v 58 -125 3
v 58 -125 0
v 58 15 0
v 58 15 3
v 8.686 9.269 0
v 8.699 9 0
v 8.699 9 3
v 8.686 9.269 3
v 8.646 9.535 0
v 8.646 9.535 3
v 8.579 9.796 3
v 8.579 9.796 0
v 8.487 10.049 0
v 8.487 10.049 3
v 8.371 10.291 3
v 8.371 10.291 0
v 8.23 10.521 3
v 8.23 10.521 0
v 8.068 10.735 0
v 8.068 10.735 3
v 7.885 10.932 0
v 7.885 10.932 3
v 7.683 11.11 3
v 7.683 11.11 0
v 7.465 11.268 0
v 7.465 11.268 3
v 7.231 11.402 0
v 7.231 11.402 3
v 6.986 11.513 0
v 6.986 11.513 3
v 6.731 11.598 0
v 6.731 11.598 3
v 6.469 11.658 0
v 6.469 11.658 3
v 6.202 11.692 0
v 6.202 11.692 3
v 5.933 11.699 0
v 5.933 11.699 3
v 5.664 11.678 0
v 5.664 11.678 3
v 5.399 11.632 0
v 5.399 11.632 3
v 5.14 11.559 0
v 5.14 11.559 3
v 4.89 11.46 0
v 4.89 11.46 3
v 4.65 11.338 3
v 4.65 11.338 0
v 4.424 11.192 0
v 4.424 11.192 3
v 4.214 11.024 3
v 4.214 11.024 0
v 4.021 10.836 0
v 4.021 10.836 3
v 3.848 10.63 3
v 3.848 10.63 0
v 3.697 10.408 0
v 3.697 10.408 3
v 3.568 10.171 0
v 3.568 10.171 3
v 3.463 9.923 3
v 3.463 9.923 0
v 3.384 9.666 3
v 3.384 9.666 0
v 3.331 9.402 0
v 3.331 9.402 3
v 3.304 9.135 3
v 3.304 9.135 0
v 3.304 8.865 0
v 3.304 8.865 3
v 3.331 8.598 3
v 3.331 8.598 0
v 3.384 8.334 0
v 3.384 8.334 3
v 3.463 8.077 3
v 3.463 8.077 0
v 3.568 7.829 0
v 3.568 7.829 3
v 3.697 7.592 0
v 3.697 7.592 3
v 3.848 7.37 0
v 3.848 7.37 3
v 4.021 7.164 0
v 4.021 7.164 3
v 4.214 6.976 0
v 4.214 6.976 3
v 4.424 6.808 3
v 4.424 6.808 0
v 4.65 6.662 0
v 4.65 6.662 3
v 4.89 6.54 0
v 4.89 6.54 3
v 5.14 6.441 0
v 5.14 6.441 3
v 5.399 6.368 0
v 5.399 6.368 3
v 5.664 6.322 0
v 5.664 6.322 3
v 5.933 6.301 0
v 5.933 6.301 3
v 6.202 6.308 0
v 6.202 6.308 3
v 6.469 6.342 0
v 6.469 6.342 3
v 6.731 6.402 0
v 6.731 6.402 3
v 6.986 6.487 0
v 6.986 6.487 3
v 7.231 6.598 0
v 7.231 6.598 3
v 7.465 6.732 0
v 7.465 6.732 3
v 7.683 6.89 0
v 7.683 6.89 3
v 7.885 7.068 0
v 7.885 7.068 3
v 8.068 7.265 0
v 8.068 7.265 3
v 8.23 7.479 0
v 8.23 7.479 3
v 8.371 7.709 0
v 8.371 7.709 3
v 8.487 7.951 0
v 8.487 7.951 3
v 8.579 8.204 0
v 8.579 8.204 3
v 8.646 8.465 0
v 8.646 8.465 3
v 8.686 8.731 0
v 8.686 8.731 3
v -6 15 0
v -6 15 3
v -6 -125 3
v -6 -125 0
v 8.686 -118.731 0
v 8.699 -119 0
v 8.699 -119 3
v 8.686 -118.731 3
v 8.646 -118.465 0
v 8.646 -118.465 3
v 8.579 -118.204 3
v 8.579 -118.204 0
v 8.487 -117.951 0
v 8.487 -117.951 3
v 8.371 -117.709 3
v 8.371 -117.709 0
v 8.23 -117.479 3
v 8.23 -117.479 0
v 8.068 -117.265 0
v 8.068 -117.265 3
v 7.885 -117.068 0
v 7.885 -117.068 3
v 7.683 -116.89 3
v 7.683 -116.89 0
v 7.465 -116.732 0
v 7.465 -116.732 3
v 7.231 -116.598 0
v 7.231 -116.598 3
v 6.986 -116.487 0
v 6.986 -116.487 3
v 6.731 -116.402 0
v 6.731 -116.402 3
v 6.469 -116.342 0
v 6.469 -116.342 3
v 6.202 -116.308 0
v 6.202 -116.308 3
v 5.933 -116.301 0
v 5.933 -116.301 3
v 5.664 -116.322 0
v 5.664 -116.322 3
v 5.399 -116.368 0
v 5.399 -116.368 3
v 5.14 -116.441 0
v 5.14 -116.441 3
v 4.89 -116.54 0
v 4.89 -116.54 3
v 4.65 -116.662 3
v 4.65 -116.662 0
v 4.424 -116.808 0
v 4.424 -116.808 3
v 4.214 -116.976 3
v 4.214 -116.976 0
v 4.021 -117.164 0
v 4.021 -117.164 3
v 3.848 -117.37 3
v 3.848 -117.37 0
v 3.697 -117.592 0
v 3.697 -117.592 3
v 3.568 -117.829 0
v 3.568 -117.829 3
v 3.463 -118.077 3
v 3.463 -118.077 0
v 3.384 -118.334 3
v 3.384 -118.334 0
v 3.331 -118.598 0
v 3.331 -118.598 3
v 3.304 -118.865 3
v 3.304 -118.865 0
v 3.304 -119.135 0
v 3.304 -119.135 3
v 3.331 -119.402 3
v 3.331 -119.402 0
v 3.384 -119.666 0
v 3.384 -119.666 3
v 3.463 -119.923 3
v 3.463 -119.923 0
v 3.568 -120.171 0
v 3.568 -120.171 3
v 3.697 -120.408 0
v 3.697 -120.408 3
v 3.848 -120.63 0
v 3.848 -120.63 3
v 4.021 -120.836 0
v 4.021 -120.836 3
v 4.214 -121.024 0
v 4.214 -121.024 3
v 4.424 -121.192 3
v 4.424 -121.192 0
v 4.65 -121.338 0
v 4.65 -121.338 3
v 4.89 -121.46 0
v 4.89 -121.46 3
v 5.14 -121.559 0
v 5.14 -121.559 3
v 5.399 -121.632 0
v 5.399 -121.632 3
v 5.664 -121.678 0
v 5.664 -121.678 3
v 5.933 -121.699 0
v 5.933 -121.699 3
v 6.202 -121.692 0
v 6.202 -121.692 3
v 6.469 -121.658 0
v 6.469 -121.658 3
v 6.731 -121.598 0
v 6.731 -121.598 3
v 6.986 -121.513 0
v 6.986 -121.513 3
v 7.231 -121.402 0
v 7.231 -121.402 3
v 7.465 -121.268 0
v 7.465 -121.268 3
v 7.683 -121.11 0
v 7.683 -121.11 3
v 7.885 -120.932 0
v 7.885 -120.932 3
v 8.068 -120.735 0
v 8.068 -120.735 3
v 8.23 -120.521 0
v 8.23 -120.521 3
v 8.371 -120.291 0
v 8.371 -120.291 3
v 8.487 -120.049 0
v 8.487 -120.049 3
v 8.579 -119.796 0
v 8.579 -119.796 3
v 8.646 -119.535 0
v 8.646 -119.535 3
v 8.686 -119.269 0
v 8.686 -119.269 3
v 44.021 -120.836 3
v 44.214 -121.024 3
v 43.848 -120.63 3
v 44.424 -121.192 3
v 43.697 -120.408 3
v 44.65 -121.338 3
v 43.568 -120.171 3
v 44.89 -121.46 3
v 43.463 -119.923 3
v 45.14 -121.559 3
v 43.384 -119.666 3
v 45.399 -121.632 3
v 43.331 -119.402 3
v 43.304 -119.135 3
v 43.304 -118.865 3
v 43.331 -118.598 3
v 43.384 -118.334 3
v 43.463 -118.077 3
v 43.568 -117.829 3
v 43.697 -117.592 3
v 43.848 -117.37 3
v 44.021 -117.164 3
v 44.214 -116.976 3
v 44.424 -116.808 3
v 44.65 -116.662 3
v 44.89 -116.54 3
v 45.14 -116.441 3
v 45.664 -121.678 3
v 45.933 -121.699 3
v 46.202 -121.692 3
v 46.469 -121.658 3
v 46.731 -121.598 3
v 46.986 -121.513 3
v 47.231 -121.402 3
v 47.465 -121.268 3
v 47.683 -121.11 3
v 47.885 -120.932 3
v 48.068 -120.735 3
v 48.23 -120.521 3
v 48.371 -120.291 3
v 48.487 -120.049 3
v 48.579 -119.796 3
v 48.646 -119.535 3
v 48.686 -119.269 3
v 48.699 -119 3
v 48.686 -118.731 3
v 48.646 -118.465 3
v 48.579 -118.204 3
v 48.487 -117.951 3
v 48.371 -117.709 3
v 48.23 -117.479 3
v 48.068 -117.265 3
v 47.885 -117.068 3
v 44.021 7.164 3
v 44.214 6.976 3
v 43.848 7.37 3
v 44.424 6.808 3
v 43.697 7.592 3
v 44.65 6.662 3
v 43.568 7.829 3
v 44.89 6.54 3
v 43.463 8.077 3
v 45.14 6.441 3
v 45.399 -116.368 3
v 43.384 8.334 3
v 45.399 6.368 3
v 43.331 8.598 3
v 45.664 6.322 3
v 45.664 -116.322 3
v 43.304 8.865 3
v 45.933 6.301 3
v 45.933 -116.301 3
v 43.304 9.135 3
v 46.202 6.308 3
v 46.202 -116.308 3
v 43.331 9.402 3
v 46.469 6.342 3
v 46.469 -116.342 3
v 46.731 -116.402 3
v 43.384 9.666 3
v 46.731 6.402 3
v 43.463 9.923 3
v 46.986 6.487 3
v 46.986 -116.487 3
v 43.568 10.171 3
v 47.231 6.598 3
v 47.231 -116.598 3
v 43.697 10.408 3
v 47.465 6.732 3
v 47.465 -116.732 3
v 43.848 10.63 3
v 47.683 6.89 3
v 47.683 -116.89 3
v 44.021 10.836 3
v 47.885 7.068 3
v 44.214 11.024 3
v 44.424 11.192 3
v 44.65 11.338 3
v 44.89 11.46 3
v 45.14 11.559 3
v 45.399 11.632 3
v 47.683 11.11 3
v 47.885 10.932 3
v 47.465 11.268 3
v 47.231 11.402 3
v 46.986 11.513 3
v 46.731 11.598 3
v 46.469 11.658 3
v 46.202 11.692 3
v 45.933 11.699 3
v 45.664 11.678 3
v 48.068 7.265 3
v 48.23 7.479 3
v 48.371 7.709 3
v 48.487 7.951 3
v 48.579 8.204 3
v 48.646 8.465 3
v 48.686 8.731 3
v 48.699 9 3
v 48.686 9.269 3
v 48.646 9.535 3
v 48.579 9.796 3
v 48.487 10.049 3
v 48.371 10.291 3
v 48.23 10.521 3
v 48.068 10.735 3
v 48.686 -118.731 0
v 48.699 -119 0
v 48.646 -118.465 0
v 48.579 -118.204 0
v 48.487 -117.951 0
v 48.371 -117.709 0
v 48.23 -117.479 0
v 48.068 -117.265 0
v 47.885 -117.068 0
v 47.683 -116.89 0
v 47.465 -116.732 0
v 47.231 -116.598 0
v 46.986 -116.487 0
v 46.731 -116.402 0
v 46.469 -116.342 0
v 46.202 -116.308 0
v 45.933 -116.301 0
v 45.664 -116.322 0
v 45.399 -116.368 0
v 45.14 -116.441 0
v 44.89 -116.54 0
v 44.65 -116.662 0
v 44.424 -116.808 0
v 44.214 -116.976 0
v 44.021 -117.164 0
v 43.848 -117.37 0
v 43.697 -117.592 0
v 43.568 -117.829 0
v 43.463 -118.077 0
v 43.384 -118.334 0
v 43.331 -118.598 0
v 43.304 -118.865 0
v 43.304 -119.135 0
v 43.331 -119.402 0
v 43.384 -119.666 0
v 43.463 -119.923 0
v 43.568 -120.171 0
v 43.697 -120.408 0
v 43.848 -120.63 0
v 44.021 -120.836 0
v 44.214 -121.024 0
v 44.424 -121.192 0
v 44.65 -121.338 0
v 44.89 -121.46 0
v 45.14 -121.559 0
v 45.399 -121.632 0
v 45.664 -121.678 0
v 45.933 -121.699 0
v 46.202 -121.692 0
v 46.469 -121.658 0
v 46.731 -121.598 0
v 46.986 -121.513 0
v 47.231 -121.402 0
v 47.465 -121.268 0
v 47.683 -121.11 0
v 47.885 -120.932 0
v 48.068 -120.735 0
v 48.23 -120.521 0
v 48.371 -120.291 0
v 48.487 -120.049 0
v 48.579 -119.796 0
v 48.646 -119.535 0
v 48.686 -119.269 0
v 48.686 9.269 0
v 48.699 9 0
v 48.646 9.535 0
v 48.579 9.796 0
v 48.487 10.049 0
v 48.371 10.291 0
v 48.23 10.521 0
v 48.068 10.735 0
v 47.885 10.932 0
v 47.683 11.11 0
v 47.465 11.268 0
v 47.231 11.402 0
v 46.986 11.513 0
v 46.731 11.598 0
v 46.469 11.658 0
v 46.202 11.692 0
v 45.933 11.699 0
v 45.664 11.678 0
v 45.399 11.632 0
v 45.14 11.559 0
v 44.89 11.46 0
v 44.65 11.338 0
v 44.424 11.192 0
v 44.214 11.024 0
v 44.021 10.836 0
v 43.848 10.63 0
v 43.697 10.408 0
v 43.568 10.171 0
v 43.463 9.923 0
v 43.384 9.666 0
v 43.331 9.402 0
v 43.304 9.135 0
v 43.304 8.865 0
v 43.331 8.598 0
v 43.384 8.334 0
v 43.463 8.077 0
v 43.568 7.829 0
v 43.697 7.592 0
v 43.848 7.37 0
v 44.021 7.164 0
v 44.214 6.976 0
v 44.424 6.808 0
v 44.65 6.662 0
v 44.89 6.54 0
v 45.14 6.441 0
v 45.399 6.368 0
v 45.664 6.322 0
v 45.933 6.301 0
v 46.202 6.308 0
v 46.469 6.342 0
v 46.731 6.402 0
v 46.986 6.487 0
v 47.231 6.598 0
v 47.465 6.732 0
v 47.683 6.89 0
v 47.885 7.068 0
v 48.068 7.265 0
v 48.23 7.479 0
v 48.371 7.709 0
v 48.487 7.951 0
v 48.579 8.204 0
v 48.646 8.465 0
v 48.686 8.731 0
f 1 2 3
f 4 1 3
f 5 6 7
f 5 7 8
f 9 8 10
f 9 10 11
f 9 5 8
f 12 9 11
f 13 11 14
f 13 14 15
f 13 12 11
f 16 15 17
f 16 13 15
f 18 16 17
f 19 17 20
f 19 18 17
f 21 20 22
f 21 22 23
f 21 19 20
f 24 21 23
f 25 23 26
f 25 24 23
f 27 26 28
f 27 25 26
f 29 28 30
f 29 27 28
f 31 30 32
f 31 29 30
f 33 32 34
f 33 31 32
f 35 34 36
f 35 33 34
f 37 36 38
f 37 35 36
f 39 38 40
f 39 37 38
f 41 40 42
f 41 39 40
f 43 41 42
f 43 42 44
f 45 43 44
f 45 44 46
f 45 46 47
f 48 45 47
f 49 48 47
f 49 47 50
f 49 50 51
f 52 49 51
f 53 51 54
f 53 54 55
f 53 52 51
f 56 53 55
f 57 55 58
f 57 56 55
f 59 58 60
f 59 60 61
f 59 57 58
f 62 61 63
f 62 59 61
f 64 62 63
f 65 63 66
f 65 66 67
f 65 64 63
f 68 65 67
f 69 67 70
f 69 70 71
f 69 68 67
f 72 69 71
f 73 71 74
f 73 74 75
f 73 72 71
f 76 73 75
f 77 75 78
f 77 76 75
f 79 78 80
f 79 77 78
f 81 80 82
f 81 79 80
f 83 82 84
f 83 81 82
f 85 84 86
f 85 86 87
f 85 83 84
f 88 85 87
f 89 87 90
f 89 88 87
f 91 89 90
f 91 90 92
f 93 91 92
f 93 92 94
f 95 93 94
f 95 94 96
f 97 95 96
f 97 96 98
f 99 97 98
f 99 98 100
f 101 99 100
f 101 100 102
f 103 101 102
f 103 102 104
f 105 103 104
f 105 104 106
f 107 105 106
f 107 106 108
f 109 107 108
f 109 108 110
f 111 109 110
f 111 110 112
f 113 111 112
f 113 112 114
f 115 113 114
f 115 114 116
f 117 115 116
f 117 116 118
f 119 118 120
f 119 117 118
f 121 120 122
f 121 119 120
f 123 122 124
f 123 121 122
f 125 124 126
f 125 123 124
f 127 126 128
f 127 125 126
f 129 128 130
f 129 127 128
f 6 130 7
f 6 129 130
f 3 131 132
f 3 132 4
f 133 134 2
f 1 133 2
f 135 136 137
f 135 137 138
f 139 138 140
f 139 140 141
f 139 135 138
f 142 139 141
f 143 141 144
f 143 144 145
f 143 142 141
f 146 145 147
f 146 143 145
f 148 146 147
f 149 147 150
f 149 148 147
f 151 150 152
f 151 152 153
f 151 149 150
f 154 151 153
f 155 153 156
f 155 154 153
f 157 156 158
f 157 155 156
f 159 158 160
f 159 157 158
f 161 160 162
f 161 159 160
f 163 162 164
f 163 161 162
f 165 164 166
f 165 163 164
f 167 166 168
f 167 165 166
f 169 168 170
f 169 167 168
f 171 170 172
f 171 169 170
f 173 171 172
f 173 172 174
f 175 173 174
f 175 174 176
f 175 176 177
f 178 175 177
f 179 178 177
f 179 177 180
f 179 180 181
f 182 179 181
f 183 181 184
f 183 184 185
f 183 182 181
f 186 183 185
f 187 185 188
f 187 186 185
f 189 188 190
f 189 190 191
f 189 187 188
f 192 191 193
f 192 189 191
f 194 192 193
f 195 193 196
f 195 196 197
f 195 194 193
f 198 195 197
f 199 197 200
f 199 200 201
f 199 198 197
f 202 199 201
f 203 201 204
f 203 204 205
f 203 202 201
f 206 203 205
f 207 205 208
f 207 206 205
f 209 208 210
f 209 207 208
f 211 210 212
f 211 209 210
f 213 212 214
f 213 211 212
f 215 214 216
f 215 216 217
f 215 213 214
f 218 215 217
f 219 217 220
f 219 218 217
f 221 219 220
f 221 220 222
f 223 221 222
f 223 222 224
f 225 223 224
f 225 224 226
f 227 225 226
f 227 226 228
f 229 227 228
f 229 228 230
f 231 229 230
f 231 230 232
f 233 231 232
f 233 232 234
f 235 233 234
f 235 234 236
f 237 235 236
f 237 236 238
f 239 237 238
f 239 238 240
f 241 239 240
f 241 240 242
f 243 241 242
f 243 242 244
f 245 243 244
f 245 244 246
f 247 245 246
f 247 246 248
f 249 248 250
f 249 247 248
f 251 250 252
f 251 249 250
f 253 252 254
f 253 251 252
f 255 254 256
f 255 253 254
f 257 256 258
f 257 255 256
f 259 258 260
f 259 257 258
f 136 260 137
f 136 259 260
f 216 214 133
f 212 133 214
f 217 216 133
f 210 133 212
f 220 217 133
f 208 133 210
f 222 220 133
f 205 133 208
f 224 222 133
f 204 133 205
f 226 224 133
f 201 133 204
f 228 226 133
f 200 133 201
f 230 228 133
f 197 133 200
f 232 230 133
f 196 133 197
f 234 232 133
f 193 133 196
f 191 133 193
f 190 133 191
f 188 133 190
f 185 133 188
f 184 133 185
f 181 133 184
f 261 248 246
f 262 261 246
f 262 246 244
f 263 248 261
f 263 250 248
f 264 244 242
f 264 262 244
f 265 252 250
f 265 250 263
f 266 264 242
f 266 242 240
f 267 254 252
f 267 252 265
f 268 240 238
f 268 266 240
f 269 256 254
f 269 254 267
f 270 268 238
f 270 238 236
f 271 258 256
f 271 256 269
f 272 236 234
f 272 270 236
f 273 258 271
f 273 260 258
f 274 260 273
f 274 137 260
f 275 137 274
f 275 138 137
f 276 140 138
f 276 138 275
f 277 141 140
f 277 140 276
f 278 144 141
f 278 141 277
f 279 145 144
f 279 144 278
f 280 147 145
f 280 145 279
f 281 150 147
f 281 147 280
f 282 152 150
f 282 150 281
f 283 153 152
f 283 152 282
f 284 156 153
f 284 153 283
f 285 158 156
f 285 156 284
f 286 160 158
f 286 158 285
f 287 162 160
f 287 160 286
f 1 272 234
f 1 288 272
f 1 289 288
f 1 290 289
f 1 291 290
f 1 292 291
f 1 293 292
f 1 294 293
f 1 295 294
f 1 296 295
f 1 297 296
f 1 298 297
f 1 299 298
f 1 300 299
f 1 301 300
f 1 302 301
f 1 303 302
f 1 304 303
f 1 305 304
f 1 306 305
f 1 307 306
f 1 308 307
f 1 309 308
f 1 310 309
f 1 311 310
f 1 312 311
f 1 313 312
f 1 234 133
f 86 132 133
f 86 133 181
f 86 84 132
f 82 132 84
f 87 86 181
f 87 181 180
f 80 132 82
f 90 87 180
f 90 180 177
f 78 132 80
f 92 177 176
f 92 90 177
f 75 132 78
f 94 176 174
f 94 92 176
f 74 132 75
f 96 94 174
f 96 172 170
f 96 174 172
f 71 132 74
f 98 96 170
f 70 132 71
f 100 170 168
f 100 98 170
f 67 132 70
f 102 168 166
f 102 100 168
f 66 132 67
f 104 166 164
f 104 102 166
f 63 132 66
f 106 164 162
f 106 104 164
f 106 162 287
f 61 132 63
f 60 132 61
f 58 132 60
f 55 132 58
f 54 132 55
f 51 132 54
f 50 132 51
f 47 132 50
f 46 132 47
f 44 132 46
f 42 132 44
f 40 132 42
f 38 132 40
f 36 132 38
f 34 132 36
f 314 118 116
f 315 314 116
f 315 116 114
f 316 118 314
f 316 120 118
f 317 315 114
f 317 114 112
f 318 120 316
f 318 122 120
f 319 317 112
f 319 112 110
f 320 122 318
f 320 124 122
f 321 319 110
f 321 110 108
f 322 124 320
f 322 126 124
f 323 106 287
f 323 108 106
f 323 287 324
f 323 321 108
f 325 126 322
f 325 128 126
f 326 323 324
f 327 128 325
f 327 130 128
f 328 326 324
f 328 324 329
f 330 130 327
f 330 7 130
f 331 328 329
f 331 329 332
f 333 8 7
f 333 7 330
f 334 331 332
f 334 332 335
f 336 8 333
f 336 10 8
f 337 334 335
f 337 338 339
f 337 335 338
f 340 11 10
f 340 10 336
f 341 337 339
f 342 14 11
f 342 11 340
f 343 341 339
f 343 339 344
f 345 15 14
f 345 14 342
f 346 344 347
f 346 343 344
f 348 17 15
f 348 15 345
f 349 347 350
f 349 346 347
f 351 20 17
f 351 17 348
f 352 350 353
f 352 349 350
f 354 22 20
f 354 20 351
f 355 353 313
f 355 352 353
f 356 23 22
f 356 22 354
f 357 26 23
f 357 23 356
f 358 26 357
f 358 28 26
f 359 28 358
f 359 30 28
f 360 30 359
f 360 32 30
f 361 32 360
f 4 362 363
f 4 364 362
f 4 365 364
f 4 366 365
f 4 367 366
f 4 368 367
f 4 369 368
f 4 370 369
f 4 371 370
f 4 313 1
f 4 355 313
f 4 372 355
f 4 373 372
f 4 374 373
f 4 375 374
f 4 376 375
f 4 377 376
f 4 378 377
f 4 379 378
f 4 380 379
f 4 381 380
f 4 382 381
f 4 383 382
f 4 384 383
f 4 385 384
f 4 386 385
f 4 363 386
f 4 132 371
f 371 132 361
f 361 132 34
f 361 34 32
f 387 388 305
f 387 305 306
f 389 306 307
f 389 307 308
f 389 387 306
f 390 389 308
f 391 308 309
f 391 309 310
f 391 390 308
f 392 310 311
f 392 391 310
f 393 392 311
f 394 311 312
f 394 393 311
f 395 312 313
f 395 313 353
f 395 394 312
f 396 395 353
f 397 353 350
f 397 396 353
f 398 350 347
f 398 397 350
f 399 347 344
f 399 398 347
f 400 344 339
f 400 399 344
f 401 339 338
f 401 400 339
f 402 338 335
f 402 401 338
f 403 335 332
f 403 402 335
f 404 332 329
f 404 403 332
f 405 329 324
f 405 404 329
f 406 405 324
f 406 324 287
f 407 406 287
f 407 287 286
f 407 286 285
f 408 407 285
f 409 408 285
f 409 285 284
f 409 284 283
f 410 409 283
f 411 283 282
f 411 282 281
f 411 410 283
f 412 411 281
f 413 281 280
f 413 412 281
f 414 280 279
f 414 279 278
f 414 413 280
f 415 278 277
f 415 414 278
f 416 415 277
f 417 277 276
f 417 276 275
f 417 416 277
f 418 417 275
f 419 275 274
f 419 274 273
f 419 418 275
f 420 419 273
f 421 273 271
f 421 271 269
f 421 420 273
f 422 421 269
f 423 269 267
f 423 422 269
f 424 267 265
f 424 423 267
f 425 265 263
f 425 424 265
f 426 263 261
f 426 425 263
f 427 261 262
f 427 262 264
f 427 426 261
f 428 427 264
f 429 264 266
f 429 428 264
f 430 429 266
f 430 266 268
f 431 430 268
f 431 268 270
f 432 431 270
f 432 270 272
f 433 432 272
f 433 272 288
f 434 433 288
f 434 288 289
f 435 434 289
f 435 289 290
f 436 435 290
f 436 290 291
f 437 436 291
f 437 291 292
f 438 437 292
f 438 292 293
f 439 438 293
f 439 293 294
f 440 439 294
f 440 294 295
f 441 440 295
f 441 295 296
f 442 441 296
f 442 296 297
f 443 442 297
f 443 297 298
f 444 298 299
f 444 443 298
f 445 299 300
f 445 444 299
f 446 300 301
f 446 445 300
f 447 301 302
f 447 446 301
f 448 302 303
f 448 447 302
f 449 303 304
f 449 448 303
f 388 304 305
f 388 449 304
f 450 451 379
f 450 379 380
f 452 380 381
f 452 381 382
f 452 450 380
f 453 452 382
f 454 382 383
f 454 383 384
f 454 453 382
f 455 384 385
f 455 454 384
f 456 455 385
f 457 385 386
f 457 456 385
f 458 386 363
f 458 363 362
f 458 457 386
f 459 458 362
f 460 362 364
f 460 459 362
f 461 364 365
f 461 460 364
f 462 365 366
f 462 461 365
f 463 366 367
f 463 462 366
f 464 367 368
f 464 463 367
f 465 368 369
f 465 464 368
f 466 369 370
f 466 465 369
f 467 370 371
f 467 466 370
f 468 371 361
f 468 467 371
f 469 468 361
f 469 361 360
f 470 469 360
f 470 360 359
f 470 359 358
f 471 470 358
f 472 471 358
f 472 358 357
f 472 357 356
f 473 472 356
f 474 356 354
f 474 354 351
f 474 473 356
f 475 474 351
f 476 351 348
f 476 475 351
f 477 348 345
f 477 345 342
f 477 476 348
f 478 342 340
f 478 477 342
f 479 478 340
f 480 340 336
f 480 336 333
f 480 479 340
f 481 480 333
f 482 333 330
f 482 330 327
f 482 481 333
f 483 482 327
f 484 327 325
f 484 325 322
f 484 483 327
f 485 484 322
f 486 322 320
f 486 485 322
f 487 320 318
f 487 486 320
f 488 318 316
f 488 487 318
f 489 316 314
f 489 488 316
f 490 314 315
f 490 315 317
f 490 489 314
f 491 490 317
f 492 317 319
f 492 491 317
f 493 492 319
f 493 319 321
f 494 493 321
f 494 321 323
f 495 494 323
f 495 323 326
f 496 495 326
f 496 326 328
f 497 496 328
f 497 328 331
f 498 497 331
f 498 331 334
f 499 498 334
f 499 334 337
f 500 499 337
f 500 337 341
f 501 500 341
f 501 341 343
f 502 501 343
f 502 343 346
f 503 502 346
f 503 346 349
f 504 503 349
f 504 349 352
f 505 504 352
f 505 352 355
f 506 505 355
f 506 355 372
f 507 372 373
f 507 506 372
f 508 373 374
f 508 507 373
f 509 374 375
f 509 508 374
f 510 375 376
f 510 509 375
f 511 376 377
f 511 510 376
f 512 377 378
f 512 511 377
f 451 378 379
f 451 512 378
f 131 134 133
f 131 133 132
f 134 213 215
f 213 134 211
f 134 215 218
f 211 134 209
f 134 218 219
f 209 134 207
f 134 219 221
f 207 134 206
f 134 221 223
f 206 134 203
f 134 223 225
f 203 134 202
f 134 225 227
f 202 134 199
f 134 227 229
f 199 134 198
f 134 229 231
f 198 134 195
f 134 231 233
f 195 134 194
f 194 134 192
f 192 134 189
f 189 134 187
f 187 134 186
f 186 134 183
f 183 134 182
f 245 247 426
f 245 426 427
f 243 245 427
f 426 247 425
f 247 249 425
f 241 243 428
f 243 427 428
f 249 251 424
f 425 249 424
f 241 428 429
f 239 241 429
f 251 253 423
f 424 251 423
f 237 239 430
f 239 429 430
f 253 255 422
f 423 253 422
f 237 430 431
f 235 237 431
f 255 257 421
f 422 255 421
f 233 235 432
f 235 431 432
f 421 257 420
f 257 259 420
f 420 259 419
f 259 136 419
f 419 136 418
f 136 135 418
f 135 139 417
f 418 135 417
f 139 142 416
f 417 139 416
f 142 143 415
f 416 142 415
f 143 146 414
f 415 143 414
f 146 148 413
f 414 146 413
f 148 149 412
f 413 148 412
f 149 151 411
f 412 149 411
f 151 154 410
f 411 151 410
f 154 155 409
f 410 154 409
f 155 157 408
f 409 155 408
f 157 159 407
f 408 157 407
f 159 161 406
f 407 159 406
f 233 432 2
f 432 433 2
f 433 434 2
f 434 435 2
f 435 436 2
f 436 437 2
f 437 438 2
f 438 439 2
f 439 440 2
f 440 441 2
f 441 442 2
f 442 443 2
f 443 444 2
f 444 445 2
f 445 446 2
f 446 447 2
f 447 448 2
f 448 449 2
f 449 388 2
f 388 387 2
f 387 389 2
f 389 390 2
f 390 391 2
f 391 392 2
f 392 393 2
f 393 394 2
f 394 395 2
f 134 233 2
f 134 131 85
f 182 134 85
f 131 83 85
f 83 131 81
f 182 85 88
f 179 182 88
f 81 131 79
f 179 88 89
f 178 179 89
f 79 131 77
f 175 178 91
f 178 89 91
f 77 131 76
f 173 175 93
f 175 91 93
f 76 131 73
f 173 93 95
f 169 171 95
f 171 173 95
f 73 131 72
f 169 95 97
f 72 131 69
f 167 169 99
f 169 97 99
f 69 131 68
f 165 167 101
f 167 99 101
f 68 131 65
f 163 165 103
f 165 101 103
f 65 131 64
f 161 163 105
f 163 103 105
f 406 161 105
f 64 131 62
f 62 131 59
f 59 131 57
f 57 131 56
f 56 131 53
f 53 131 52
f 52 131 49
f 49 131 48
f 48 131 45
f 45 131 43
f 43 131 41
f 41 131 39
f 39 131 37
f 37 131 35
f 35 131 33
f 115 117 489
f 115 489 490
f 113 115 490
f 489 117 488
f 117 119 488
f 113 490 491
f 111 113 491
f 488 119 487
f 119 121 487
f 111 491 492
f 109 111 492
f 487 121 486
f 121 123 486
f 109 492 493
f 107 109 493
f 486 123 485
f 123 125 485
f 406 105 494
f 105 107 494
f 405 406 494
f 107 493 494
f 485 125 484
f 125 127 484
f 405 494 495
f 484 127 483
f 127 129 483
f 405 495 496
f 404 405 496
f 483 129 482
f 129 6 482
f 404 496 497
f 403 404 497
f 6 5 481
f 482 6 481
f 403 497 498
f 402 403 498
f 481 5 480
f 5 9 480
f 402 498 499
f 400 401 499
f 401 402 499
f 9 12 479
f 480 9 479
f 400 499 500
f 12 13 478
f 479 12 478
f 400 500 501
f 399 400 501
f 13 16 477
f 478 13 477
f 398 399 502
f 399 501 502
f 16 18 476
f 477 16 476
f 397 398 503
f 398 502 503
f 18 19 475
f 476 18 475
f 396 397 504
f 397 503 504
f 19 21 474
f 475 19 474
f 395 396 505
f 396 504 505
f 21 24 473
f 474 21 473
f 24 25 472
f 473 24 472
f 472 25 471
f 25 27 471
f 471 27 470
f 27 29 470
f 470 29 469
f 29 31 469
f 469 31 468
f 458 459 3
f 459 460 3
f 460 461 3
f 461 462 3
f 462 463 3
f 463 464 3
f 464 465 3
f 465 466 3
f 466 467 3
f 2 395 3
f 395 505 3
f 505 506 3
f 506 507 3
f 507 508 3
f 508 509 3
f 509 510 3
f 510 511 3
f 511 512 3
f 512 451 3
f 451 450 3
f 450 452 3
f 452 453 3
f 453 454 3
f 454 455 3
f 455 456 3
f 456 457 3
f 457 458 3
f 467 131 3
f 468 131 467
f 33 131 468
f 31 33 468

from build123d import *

# Parameters (mm, degrees)
SKETCH1_W           = 64
SKETCH1_H           = 140
SKETCH1_R           = 2.699339217
SKETCH1_W_2         = 52
SKETCH1_H_2         = 110
BOSS_EXTRUDE1_DEPTH = 3


with BuildPart() as part:
    # Sketch1 → Boss-Extrude1 (new body)
    # profile 1 of 2: a face of its own
    with BuildSketch(Plane.XY):
        with Locations((26, -55)):
            Rectangle(SKETCH1_W, SKETCH1_H)
        with Locations((46, 9)):
            Circle(SKETCH1_R, mode=Mode.SUBTRACT)
        with Locations((6, 9)):
            Circle(SKETCH1_R, mode=Mode.SUBTRACT)
        with Locations((46, -119)):
            Circle(SKETCH1_R, mode=Mode.SUBTRACT)
        with Locations((6, -119)):
            Circle(SKETCH1_R, mode=Mode.SUBTRACT)
        with Locations((26, -55)):
            Rectangle(SKETCH1_W_2, SKETCH1_H_2, mode=Mode.SUBTRACT)
    # profile 2 of 2: a face of its own
    with BuildSketch(Plane.XY):
        with Locations((26, -55)):
            Rectangle(SKETCH1_W_2, SKETCH1_H_2)
    extrude(amount=BOSS_EXTRUDE1_DEPTH)


solid = part.part
